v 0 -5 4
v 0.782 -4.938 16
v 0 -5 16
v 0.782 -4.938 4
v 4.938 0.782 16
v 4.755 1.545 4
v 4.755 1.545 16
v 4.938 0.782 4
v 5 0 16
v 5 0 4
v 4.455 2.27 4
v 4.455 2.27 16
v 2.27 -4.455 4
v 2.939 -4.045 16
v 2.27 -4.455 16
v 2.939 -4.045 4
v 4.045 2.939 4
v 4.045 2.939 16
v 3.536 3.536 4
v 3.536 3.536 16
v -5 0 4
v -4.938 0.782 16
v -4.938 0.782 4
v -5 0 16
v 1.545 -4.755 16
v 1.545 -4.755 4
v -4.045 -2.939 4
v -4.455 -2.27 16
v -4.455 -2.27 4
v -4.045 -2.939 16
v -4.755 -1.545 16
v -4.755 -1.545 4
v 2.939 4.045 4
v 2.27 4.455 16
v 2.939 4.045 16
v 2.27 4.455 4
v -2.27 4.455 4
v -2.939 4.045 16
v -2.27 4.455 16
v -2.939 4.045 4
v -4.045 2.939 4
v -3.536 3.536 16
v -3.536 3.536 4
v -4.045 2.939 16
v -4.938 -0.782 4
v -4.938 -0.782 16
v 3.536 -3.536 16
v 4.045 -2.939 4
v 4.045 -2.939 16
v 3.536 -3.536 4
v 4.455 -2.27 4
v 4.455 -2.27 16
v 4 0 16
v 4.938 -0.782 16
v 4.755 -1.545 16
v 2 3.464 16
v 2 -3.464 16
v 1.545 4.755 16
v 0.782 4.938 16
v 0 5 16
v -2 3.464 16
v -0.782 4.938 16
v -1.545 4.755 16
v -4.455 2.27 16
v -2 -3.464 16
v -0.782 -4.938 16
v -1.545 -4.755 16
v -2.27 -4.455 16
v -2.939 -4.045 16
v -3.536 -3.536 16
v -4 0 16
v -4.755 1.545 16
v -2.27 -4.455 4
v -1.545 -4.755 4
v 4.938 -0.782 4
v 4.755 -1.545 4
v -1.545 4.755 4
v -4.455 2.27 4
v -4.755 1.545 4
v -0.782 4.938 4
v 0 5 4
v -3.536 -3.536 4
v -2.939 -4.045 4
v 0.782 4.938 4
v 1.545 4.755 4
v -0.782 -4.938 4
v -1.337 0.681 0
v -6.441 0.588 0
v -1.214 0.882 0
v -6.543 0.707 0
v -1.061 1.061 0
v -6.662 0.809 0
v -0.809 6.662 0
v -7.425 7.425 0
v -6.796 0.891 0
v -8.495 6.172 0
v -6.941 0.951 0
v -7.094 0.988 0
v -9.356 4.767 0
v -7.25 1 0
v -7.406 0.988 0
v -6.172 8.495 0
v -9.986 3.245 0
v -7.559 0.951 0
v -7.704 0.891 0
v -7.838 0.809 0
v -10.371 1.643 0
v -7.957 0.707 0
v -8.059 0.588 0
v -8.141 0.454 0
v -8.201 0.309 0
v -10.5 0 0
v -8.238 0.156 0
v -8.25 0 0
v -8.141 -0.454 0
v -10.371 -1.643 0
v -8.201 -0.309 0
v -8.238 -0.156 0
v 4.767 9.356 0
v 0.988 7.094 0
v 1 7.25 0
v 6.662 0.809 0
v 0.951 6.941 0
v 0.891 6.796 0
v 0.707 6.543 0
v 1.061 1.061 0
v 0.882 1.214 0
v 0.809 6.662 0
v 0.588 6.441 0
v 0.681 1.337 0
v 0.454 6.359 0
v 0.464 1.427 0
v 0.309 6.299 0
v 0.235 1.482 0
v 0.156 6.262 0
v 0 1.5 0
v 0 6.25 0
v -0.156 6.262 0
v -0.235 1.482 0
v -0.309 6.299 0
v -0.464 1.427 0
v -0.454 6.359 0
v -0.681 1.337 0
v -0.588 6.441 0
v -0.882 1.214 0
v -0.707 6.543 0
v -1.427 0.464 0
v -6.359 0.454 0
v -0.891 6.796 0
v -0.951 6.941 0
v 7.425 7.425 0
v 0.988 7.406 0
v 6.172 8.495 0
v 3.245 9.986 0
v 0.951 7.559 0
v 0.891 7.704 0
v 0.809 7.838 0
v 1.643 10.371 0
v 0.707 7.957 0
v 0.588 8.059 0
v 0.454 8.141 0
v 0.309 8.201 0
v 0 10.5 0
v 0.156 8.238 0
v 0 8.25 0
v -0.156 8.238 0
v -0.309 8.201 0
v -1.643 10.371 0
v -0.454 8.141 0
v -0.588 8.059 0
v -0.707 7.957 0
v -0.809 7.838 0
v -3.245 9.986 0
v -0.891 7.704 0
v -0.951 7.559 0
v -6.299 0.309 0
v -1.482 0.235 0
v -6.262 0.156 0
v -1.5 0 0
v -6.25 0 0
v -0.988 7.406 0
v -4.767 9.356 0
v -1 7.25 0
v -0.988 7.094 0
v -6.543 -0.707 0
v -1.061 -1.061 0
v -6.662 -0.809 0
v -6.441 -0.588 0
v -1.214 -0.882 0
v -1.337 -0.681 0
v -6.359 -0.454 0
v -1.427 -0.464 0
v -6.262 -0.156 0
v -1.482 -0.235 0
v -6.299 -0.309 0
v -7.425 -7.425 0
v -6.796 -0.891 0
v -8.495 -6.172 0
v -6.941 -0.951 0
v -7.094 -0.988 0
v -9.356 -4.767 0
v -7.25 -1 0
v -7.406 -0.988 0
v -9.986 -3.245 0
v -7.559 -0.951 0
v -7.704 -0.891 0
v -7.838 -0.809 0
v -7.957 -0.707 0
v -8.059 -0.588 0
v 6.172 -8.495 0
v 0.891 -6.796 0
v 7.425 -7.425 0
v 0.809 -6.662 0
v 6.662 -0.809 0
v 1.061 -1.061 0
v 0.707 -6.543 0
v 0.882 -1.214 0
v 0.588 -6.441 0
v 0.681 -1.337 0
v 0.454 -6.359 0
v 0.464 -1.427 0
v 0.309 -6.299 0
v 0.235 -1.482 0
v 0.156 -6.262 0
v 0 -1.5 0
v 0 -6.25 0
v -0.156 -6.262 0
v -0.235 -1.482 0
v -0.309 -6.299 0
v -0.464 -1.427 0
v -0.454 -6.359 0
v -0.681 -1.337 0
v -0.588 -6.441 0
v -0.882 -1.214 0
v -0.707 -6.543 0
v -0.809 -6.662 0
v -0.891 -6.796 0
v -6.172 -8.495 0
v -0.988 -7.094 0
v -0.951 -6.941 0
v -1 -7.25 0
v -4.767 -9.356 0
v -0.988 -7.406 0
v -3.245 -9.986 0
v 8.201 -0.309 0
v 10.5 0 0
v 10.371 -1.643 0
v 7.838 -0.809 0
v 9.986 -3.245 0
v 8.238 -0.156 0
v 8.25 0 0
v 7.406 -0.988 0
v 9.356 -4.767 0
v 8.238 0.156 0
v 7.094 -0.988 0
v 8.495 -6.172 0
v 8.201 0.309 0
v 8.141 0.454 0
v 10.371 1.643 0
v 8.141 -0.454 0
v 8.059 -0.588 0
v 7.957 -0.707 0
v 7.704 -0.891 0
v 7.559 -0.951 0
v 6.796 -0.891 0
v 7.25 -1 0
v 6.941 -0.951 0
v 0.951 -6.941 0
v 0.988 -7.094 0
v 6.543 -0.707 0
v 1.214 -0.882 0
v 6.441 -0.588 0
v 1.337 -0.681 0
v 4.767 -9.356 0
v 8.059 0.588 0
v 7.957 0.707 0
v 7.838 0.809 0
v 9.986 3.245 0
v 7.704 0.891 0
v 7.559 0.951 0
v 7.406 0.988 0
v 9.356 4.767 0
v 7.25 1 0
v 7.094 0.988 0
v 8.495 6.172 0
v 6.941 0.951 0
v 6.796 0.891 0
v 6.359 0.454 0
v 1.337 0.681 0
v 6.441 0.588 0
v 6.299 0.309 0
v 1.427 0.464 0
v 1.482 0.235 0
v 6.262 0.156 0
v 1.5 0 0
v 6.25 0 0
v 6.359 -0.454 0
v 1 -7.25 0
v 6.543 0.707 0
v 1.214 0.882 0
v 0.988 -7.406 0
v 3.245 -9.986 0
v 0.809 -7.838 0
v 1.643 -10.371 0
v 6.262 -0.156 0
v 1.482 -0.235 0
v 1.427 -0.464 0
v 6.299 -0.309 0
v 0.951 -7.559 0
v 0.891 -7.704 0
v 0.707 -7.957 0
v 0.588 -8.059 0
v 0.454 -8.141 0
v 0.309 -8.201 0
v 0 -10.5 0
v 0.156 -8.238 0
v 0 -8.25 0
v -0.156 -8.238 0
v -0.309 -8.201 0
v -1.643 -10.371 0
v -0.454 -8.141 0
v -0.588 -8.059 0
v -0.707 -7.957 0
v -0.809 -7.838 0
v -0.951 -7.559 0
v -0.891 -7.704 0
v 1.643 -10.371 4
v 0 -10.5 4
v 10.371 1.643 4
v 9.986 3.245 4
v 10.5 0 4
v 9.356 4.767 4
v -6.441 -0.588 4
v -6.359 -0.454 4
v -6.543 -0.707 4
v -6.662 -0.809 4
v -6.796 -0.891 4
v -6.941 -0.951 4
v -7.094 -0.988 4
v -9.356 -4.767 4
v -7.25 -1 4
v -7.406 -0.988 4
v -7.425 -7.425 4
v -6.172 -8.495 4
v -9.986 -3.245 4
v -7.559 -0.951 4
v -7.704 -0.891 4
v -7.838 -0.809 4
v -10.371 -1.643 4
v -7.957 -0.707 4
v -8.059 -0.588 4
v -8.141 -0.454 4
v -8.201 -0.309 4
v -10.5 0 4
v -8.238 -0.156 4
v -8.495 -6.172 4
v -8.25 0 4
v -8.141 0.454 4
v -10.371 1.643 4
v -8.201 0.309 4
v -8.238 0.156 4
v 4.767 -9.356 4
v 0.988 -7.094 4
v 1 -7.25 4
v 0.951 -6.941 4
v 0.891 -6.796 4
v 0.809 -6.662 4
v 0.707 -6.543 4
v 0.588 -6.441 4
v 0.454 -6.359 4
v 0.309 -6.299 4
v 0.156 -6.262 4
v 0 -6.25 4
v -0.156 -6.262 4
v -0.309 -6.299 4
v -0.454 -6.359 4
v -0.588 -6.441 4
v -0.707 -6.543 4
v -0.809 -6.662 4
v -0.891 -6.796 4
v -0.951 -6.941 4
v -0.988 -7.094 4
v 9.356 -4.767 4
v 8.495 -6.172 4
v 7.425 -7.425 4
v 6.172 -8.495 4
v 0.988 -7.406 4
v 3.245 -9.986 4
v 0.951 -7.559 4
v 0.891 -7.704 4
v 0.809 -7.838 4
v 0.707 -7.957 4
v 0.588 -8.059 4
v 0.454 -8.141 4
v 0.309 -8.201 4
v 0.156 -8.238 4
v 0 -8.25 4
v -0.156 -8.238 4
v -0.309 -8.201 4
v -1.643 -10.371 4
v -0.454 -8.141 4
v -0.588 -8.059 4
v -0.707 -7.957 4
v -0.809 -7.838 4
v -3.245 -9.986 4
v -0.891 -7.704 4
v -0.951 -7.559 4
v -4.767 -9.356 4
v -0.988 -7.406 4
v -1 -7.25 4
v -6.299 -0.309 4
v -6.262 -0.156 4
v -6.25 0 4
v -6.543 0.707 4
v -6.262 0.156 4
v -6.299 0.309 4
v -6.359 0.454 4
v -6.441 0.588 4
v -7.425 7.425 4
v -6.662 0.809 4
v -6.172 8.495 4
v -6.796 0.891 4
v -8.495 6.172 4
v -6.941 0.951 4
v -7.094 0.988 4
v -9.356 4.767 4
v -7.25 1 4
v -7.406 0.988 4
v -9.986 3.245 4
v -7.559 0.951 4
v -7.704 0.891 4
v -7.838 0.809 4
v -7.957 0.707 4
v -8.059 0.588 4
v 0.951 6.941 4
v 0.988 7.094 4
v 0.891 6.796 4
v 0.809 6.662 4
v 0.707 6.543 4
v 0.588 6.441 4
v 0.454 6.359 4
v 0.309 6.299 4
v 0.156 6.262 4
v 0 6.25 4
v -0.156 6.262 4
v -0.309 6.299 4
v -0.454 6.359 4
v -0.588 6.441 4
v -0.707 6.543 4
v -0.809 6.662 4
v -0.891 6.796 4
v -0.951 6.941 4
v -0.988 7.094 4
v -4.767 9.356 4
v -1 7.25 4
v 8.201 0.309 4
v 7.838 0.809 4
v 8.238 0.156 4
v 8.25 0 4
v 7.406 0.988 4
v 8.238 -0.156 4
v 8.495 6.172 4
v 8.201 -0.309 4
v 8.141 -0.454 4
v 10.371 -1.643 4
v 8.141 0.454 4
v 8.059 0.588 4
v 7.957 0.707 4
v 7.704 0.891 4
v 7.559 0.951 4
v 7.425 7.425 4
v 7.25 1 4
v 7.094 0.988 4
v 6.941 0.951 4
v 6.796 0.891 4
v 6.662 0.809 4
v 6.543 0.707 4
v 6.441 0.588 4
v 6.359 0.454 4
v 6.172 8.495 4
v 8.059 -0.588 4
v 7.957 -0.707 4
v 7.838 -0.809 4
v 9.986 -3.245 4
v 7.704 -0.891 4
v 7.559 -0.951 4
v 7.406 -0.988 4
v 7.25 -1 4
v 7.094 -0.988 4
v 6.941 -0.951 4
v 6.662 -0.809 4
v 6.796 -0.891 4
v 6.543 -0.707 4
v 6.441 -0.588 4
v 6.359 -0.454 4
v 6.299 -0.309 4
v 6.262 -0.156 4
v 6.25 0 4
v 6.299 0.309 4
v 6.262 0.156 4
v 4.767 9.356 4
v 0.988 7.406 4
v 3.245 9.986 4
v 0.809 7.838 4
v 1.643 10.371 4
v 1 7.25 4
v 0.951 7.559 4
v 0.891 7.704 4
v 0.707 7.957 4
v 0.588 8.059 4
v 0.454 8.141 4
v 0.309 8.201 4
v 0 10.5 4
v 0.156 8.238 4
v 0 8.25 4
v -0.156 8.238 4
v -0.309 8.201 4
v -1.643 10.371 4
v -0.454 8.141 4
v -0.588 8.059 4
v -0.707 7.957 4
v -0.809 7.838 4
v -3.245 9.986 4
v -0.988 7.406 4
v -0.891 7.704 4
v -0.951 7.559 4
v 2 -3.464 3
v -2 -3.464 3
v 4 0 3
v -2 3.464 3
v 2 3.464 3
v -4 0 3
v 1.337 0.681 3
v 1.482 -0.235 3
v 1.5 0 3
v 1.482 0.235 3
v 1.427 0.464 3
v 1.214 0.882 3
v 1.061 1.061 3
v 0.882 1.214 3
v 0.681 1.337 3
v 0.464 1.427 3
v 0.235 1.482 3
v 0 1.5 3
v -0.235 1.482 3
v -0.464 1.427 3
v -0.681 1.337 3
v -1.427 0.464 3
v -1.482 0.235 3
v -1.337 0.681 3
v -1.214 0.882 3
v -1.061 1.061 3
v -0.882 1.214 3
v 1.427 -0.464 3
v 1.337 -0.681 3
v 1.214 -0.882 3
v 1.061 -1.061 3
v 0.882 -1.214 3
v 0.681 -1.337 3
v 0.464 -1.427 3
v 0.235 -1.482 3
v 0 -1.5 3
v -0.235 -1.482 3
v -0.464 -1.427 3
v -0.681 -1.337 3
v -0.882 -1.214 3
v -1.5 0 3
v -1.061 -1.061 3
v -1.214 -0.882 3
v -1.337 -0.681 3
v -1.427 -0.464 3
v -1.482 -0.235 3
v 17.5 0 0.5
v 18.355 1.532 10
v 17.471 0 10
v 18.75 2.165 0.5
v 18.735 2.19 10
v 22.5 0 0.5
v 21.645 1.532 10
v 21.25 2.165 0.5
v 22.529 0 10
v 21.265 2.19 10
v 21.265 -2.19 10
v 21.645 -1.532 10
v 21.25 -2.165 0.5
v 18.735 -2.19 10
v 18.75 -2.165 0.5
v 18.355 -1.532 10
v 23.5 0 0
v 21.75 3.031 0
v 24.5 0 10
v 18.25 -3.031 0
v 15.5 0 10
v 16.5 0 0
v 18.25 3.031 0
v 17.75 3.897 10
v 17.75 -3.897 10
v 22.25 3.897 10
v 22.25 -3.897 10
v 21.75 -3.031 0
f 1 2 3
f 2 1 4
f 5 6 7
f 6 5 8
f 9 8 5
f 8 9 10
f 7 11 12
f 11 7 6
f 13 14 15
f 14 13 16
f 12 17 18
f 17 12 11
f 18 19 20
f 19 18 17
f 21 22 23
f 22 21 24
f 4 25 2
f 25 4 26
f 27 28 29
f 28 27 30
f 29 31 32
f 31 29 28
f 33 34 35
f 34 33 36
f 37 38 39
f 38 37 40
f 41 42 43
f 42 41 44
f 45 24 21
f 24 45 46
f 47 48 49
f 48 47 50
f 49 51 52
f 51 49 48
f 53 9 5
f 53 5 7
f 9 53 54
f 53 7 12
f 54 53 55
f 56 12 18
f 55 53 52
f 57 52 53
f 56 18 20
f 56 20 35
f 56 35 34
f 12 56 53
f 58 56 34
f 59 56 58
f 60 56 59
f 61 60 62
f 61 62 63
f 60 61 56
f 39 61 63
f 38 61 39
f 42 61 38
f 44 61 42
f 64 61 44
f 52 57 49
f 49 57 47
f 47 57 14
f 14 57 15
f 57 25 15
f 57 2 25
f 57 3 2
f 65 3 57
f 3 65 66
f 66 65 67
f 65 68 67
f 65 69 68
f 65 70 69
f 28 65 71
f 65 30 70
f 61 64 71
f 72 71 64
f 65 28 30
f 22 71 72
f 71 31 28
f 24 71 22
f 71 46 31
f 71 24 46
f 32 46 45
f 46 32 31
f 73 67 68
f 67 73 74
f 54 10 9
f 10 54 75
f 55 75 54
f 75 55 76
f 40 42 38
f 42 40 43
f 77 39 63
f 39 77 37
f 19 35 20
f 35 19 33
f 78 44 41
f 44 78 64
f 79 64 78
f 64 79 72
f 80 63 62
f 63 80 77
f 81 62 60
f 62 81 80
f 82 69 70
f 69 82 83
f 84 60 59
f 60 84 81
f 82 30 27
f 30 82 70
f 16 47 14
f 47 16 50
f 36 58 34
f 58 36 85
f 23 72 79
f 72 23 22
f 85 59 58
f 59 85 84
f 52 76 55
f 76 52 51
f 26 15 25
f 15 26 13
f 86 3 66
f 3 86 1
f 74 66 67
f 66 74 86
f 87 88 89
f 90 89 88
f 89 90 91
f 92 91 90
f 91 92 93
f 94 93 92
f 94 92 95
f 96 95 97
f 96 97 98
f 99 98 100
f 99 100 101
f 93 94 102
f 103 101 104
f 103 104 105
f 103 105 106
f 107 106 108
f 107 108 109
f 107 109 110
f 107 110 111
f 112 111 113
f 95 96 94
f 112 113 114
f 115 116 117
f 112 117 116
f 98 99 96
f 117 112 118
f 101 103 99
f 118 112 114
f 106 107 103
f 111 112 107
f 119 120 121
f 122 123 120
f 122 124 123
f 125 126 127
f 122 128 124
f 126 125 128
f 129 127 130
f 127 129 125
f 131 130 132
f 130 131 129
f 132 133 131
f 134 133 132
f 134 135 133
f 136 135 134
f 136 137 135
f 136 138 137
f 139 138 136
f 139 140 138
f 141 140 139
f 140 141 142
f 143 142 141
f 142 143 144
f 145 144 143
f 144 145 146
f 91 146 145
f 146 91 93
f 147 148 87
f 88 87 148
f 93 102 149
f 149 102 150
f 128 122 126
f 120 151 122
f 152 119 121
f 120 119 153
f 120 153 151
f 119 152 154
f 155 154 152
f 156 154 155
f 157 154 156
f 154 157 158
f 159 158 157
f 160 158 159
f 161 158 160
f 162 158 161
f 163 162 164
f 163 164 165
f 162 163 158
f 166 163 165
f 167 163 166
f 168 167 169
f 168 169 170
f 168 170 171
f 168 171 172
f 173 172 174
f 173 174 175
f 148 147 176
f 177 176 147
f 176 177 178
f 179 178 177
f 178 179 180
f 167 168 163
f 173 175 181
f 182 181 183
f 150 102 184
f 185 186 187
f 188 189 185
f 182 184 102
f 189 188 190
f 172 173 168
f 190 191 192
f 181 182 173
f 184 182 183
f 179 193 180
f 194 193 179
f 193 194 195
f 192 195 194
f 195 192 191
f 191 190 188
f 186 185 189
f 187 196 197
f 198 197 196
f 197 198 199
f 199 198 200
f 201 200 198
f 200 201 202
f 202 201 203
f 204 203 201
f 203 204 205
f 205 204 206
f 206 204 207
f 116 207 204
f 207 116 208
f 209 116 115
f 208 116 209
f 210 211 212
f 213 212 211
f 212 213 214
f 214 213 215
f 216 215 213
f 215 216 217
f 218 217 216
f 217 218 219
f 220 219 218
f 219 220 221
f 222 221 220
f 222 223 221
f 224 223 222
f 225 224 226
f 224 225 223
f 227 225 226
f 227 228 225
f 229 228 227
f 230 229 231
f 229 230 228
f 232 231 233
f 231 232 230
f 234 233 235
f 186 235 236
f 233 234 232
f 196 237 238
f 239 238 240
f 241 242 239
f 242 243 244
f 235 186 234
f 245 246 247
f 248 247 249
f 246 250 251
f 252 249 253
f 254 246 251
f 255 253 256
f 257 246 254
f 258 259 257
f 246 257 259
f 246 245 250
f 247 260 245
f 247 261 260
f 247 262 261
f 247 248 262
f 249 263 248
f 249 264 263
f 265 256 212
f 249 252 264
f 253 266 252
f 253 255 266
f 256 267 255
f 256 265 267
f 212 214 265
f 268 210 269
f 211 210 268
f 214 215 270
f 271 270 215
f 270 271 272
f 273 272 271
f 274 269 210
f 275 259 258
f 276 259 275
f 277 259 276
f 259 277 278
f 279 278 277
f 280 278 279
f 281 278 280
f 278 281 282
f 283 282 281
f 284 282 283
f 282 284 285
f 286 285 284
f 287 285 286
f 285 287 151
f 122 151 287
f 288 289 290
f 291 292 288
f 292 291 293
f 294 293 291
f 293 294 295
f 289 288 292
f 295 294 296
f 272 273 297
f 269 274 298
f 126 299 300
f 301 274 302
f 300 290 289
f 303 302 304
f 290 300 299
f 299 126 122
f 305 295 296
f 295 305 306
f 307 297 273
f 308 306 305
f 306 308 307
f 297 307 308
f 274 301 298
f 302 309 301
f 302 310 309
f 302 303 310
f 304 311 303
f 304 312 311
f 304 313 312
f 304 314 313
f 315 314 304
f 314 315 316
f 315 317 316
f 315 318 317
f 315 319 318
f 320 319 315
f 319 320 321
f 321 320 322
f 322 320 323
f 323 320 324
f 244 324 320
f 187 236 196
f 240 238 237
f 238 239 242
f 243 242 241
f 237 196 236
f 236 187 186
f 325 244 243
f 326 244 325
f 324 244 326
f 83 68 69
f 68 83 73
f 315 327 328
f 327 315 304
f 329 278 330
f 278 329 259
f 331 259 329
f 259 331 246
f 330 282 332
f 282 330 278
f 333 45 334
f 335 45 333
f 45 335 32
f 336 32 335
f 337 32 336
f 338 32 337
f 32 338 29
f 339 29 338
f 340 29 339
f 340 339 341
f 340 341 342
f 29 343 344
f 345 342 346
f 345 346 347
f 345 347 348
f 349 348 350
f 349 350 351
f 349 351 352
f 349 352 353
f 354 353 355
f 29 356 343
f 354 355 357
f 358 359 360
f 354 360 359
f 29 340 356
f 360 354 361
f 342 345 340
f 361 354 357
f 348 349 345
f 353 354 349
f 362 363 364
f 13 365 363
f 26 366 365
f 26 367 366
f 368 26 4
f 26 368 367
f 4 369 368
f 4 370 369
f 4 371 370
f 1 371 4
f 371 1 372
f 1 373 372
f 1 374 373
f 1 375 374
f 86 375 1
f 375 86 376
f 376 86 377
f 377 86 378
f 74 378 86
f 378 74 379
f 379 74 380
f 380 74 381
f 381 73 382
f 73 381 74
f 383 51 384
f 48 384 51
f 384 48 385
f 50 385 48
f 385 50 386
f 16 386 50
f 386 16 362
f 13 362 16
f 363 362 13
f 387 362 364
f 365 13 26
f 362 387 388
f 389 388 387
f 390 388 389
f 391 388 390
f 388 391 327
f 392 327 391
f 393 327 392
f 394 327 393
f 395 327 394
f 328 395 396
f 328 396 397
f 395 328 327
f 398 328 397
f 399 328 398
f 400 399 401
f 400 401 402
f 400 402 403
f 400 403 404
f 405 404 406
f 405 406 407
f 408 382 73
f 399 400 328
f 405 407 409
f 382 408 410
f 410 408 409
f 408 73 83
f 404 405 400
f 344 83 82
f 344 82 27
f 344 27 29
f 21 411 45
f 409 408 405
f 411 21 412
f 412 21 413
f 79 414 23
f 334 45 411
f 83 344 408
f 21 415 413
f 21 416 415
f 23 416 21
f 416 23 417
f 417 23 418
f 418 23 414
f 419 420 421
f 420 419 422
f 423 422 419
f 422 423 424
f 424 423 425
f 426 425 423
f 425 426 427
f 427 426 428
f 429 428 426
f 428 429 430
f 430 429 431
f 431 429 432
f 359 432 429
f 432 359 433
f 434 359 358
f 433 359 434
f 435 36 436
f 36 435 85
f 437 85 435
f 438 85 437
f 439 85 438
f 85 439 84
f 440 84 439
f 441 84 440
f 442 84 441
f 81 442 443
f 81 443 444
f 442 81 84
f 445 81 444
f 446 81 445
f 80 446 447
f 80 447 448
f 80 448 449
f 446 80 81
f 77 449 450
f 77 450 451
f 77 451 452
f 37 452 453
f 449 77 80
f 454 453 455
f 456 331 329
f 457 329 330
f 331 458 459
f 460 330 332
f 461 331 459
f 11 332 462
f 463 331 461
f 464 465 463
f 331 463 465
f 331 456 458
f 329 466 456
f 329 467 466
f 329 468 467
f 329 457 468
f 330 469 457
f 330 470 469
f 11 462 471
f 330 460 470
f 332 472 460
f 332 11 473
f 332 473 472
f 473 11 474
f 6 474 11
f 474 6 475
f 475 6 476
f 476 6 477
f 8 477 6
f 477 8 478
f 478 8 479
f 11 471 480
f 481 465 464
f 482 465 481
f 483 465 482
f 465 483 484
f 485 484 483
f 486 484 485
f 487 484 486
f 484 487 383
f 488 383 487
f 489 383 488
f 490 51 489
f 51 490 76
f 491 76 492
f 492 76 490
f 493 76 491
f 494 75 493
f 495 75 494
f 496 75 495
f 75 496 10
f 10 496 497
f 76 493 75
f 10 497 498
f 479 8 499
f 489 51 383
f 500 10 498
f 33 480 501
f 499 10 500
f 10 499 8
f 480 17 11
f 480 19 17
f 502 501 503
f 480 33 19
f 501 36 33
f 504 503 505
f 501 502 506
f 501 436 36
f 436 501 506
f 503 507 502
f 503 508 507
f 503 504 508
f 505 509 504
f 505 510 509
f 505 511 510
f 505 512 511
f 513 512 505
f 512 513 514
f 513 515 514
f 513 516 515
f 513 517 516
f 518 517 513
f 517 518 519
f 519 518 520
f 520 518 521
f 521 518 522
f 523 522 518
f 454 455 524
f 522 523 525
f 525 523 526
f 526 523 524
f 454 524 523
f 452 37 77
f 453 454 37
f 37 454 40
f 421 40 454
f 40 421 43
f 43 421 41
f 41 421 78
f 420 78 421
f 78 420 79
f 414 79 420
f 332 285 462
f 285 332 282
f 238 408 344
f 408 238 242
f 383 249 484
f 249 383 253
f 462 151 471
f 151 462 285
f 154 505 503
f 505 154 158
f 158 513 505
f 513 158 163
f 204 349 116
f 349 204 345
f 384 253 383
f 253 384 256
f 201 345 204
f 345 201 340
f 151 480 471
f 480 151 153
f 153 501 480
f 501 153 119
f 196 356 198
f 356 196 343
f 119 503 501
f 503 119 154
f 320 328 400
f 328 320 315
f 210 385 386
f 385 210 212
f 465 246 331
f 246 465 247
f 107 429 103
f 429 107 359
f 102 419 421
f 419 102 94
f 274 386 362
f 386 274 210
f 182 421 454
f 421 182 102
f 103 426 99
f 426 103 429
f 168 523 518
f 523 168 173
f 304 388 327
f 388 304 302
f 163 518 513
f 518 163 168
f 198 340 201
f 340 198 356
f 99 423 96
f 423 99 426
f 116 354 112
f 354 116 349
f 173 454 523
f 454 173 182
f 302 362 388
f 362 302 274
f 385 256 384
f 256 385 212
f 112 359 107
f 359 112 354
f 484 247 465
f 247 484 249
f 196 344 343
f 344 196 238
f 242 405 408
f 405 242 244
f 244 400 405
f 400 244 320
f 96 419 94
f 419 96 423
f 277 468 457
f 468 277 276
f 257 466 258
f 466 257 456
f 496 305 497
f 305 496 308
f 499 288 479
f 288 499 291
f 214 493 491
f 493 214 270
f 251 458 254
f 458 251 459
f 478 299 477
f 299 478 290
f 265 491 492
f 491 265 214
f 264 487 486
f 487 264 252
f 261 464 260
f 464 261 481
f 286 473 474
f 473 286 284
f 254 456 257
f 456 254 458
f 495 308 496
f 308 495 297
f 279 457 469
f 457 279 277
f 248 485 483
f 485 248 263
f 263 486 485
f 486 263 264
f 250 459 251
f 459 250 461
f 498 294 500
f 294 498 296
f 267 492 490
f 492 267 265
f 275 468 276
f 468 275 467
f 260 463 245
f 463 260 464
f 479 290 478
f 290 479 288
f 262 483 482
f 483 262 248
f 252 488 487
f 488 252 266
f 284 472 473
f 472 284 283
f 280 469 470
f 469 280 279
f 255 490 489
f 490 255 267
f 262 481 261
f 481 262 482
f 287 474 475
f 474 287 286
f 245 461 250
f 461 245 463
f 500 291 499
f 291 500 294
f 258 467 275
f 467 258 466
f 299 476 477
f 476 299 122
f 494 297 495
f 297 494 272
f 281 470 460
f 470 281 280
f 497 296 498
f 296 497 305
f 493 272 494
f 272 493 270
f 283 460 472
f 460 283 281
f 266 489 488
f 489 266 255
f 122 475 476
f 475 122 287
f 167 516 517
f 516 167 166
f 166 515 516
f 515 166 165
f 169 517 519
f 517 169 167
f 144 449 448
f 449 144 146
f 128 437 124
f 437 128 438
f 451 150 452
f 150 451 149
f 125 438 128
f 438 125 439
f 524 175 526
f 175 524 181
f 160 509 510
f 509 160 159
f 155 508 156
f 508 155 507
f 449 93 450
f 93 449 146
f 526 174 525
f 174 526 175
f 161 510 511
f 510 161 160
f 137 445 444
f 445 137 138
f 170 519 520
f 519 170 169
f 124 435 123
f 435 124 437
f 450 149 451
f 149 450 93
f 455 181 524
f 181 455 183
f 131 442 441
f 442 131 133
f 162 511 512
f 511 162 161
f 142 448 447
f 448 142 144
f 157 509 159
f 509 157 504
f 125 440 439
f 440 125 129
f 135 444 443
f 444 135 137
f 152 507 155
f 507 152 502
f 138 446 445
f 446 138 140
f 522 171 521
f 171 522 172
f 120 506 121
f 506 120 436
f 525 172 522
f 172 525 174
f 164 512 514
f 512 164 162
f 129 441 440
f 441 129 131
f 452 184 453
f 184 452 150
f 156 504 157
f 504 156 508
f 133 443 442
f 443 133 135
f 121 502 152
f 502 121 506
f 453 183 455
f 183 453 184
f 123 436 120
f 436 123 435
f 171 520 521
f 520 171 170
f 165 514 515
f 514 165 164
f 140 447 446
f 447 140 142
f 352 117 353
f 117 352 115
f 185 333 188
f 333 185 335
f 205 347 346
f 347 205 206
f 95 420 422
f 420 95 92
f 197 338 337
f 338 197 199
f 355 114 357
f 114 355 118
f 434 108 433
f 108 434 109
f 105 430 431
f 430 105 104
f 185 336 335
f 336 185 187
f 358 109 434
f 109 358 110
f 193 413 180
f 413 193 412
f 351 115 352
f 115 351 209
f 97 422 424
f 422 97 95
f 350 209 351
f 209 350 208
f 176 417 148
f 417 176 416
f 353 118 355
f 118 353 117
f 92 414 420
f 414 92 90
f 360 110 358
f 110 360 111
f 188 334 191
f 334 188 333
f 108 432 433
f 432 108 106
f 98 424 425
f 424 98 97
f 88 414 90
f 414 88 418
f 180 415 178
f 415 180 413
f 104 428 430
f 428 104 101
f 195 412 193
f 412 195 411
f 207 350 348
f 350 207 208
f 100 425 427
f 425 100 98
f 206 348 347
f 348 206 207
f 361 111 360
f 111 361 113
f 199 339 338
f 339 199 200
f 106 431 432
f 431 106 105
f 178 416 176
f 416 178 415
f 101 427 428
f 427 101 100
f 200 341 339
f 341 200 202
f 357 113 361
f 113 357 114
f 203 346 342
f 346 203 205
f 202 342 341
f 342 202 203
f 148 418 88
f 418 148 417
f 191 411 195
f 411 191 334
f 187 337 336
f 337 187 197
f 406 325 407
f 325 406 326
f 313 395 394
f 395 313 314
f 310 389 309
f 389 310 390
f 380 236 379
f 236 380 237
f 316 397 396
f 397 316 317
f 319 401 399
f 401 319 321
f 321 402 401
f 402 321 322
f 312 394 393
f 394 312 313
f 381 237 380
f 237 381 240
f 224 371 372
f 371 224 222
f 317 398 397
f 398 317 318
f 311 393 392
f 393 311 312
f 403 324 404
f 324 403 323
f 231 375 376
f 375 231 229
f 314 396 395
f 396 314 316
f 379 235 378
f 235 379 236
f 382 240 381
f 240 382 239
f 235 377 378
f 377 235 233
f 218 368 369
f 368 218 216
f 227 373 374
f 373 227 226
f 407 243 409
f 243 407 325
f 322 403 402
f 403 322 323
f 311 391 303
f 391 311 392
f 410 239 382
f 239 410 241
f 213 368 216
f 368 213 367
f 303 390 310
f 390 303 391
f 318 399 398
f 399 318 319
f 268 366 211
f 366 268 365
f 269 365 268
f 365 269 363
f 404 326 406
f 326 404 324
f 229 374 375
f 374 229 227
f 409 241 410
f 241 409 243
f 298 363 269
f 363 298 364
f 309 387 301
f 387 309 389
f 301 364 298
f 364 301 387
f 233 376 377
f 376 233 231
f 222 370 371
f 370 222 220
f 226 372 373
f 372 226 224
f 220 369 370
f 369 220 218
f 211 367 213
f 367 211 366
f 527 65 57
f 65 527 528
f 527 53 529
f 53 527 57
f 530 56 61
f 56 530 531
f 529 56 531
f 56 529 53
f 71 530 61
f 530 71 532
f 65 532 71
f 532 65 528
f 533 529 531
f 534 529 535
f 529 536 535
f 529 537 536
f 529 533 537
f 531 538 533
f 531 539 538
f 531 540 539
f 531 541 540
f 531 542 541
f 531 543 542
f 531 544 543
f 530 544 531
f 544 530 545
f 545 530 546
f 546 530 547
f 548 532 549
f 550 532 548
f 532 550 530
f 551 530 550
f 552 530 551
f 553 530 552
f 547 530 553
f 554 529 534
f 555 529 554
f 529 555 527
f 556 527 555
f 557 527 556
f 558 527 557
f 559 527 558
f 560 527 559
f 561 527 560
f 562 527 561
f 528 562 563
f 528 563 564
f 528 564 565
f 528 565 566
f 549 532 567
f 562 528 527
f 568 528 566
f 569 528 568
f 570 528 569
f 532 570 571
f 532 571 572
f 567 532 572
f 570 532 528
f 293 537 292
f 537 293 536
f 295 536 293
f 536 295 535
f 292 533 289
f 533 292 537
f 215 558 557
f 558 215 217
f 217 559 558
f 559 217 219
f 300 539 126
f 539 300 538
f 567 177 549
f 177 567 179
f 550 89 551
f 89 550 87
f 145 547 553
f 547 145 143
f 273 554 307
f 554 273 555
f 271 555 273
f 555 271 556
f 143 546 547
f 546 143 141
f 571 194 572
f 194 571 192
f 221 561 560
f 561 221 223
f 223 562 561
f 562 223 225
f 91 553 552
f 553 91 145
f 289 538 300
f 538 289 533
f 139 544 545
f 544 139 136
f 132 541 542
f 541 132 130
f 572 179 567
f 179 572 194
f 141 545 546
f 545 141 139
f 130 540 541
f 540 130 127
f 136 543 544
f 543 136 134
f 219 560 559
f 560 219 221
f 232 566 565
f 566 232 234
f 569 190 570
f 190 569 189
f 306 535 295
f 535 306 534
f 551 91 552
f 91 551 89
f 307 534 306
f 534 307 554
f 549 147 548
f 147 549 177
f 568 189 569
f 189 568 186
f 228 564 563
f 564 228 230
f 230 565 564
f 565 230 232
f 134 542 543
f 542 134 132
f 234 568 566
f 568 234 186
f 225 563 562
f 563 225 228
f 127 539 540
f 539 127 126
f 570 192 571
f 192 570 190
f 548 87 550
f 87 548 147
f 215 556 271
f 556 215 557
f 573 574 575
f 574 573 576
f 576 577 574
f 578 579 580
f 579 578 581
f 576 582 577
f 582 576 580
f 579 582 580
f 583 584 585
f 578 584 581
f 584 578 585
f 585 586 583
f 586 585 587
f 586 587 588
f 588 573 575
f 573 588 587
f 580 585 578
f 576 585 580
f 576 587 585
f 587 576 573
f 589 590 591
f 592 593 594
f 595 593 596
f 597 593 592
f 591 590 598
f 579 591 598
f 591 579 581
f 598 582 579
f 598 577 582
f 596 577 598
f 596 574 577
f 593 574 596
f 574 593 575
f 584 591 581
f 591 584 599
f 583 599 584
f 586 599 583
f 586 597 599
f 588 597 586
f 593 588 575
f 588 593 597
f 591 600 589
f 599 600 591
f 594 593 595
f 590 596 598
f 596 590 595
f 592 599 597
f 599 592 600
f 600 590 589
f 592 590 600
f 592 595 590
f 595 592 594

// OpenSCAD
SHAFT_OUTER_DIAMETER_TOP = 9;
SHAFT_OUTER_DIAMETER_BOTTOM = 7;
SHAFT_INNER_DIAMETER_TOP = 6;
SHAFT_INNER_DIAMETER_BOTTOM = 4;
SHAFT_SCREW_BOLT_DIAMETER = 3;
SHAFT_MOUNT_OUTER_DIAMETER = 10;
SHAFT_MOUNT_INNER_DIAMETER = 8;
SHAFT_LENGTH = 10;
SHAFT_BASE_LENGTH = 12;
SHAFT_BASE_THICKNESS = 4;
SHAFT_BASE_DIAMETER = 21;
BASE_SCREW_DIAMETER = 2;
CENTER_TO_BASE_SCREW_DISTANCE = 7.25;

print_tray();
//preview();

/*
Arrange the items on a tray for printing
*/
module print_tray() {
    motor_shaft_mount();
    translate([20, 0, 0]) {
        coupler_receptor();
    }
}

/*
Preview the coupling action in exploded view
*/
module preview() {
    motor_shaft_mount();
    translate([0, 0, SHAFT_BASE_LENGTH + SHAFT_BASE_THICKNESS]) {
        coupler_receptor();
    }
    translate([0, 0, SHAFT_BASE_LENGTH + SHAFT_LENGTH + SHAFT_BASE_THICKNESS + 43]) {
        rotate([0, 180, 0]) {
            bearingCoupler();
        }
    }
}

/*
Coupler between shaft mount and the bearing handle
*/
module coupler_receptor() {
    difference() {
        cylinder(h=SHAFT_LENGTH, d1=SHAFT_OUTER_DIAMETER_BOTTOM, d2=SHAFT_OUTER_DIAMETER_TOP, $fn=6);
        translate([0, 0, 43])
            rotate([0, 180, 0]) {
                bearingCoupler(shaft_padding = 0.2);
            }
    }
}

module motor_shaft_mount() {
    difference() {
        union() {
            cylinder(h=SHAFT_BASE_LENGTH+SHAFT_BASE_THICKNESS, d=SHAFT_MOUNT_OUTER_DIAMETER, $fn=40);
            cylinder(h=SHAFT_BASE_THICKNESS, d=SHAFT_BASE_DIAMETER, $fn=40);
        }
        translate([0, 0, SHAFT_BASE_THICKNESS - 1]) {
            cylinder(h=SHAFT_BASE_LENGTH + 2, d=SHAFT_MOUNT_INNER_DIAMETER, $fn=6);
        }

        // Primary mount point onto motor shaft
        translate([0, 0, -1])
            cylinder(h=SHAFT_BASE_THICKNESS + 2, d=SHAFT_SCREW_BOLT_DIAMETER, $fn=40);

        // Secondary mount points on motor attachment
        for (degree = [0 : 90 : 270]) {
            rotate([0, 0, degree]) {
                translate([CENTER_TO_BASE_SCREW_DISTANCE, 0, -1]) {
                    cylinder(h=SHAFT_BASE_THICKNESS + 2, d=BASE_SCREW_DIAMETER, $fn=40);
                }
            }
        }
    }
}

/*
A coupler for connecting the cam shaft to the bearing insert.
Yanked from braille_display_small.scad
*/
module bearingCoupler(shaft_padding = 0){
    shaft_length = 32.5;
    translate([0,0,5]) cylinder(d=5.1, h=5, $fn=40);
    translate([0,0,10]) {
        cylinder(d1=5.0 + shaft_padding, d2=4.8 + shaft_padding, h=shaft_length, $fn=6);
    }
    difference() {
        cylinder(d=12, h=5, $fn=40);
        cube([8.5,4.5,7.5], center=true);
    }
}
